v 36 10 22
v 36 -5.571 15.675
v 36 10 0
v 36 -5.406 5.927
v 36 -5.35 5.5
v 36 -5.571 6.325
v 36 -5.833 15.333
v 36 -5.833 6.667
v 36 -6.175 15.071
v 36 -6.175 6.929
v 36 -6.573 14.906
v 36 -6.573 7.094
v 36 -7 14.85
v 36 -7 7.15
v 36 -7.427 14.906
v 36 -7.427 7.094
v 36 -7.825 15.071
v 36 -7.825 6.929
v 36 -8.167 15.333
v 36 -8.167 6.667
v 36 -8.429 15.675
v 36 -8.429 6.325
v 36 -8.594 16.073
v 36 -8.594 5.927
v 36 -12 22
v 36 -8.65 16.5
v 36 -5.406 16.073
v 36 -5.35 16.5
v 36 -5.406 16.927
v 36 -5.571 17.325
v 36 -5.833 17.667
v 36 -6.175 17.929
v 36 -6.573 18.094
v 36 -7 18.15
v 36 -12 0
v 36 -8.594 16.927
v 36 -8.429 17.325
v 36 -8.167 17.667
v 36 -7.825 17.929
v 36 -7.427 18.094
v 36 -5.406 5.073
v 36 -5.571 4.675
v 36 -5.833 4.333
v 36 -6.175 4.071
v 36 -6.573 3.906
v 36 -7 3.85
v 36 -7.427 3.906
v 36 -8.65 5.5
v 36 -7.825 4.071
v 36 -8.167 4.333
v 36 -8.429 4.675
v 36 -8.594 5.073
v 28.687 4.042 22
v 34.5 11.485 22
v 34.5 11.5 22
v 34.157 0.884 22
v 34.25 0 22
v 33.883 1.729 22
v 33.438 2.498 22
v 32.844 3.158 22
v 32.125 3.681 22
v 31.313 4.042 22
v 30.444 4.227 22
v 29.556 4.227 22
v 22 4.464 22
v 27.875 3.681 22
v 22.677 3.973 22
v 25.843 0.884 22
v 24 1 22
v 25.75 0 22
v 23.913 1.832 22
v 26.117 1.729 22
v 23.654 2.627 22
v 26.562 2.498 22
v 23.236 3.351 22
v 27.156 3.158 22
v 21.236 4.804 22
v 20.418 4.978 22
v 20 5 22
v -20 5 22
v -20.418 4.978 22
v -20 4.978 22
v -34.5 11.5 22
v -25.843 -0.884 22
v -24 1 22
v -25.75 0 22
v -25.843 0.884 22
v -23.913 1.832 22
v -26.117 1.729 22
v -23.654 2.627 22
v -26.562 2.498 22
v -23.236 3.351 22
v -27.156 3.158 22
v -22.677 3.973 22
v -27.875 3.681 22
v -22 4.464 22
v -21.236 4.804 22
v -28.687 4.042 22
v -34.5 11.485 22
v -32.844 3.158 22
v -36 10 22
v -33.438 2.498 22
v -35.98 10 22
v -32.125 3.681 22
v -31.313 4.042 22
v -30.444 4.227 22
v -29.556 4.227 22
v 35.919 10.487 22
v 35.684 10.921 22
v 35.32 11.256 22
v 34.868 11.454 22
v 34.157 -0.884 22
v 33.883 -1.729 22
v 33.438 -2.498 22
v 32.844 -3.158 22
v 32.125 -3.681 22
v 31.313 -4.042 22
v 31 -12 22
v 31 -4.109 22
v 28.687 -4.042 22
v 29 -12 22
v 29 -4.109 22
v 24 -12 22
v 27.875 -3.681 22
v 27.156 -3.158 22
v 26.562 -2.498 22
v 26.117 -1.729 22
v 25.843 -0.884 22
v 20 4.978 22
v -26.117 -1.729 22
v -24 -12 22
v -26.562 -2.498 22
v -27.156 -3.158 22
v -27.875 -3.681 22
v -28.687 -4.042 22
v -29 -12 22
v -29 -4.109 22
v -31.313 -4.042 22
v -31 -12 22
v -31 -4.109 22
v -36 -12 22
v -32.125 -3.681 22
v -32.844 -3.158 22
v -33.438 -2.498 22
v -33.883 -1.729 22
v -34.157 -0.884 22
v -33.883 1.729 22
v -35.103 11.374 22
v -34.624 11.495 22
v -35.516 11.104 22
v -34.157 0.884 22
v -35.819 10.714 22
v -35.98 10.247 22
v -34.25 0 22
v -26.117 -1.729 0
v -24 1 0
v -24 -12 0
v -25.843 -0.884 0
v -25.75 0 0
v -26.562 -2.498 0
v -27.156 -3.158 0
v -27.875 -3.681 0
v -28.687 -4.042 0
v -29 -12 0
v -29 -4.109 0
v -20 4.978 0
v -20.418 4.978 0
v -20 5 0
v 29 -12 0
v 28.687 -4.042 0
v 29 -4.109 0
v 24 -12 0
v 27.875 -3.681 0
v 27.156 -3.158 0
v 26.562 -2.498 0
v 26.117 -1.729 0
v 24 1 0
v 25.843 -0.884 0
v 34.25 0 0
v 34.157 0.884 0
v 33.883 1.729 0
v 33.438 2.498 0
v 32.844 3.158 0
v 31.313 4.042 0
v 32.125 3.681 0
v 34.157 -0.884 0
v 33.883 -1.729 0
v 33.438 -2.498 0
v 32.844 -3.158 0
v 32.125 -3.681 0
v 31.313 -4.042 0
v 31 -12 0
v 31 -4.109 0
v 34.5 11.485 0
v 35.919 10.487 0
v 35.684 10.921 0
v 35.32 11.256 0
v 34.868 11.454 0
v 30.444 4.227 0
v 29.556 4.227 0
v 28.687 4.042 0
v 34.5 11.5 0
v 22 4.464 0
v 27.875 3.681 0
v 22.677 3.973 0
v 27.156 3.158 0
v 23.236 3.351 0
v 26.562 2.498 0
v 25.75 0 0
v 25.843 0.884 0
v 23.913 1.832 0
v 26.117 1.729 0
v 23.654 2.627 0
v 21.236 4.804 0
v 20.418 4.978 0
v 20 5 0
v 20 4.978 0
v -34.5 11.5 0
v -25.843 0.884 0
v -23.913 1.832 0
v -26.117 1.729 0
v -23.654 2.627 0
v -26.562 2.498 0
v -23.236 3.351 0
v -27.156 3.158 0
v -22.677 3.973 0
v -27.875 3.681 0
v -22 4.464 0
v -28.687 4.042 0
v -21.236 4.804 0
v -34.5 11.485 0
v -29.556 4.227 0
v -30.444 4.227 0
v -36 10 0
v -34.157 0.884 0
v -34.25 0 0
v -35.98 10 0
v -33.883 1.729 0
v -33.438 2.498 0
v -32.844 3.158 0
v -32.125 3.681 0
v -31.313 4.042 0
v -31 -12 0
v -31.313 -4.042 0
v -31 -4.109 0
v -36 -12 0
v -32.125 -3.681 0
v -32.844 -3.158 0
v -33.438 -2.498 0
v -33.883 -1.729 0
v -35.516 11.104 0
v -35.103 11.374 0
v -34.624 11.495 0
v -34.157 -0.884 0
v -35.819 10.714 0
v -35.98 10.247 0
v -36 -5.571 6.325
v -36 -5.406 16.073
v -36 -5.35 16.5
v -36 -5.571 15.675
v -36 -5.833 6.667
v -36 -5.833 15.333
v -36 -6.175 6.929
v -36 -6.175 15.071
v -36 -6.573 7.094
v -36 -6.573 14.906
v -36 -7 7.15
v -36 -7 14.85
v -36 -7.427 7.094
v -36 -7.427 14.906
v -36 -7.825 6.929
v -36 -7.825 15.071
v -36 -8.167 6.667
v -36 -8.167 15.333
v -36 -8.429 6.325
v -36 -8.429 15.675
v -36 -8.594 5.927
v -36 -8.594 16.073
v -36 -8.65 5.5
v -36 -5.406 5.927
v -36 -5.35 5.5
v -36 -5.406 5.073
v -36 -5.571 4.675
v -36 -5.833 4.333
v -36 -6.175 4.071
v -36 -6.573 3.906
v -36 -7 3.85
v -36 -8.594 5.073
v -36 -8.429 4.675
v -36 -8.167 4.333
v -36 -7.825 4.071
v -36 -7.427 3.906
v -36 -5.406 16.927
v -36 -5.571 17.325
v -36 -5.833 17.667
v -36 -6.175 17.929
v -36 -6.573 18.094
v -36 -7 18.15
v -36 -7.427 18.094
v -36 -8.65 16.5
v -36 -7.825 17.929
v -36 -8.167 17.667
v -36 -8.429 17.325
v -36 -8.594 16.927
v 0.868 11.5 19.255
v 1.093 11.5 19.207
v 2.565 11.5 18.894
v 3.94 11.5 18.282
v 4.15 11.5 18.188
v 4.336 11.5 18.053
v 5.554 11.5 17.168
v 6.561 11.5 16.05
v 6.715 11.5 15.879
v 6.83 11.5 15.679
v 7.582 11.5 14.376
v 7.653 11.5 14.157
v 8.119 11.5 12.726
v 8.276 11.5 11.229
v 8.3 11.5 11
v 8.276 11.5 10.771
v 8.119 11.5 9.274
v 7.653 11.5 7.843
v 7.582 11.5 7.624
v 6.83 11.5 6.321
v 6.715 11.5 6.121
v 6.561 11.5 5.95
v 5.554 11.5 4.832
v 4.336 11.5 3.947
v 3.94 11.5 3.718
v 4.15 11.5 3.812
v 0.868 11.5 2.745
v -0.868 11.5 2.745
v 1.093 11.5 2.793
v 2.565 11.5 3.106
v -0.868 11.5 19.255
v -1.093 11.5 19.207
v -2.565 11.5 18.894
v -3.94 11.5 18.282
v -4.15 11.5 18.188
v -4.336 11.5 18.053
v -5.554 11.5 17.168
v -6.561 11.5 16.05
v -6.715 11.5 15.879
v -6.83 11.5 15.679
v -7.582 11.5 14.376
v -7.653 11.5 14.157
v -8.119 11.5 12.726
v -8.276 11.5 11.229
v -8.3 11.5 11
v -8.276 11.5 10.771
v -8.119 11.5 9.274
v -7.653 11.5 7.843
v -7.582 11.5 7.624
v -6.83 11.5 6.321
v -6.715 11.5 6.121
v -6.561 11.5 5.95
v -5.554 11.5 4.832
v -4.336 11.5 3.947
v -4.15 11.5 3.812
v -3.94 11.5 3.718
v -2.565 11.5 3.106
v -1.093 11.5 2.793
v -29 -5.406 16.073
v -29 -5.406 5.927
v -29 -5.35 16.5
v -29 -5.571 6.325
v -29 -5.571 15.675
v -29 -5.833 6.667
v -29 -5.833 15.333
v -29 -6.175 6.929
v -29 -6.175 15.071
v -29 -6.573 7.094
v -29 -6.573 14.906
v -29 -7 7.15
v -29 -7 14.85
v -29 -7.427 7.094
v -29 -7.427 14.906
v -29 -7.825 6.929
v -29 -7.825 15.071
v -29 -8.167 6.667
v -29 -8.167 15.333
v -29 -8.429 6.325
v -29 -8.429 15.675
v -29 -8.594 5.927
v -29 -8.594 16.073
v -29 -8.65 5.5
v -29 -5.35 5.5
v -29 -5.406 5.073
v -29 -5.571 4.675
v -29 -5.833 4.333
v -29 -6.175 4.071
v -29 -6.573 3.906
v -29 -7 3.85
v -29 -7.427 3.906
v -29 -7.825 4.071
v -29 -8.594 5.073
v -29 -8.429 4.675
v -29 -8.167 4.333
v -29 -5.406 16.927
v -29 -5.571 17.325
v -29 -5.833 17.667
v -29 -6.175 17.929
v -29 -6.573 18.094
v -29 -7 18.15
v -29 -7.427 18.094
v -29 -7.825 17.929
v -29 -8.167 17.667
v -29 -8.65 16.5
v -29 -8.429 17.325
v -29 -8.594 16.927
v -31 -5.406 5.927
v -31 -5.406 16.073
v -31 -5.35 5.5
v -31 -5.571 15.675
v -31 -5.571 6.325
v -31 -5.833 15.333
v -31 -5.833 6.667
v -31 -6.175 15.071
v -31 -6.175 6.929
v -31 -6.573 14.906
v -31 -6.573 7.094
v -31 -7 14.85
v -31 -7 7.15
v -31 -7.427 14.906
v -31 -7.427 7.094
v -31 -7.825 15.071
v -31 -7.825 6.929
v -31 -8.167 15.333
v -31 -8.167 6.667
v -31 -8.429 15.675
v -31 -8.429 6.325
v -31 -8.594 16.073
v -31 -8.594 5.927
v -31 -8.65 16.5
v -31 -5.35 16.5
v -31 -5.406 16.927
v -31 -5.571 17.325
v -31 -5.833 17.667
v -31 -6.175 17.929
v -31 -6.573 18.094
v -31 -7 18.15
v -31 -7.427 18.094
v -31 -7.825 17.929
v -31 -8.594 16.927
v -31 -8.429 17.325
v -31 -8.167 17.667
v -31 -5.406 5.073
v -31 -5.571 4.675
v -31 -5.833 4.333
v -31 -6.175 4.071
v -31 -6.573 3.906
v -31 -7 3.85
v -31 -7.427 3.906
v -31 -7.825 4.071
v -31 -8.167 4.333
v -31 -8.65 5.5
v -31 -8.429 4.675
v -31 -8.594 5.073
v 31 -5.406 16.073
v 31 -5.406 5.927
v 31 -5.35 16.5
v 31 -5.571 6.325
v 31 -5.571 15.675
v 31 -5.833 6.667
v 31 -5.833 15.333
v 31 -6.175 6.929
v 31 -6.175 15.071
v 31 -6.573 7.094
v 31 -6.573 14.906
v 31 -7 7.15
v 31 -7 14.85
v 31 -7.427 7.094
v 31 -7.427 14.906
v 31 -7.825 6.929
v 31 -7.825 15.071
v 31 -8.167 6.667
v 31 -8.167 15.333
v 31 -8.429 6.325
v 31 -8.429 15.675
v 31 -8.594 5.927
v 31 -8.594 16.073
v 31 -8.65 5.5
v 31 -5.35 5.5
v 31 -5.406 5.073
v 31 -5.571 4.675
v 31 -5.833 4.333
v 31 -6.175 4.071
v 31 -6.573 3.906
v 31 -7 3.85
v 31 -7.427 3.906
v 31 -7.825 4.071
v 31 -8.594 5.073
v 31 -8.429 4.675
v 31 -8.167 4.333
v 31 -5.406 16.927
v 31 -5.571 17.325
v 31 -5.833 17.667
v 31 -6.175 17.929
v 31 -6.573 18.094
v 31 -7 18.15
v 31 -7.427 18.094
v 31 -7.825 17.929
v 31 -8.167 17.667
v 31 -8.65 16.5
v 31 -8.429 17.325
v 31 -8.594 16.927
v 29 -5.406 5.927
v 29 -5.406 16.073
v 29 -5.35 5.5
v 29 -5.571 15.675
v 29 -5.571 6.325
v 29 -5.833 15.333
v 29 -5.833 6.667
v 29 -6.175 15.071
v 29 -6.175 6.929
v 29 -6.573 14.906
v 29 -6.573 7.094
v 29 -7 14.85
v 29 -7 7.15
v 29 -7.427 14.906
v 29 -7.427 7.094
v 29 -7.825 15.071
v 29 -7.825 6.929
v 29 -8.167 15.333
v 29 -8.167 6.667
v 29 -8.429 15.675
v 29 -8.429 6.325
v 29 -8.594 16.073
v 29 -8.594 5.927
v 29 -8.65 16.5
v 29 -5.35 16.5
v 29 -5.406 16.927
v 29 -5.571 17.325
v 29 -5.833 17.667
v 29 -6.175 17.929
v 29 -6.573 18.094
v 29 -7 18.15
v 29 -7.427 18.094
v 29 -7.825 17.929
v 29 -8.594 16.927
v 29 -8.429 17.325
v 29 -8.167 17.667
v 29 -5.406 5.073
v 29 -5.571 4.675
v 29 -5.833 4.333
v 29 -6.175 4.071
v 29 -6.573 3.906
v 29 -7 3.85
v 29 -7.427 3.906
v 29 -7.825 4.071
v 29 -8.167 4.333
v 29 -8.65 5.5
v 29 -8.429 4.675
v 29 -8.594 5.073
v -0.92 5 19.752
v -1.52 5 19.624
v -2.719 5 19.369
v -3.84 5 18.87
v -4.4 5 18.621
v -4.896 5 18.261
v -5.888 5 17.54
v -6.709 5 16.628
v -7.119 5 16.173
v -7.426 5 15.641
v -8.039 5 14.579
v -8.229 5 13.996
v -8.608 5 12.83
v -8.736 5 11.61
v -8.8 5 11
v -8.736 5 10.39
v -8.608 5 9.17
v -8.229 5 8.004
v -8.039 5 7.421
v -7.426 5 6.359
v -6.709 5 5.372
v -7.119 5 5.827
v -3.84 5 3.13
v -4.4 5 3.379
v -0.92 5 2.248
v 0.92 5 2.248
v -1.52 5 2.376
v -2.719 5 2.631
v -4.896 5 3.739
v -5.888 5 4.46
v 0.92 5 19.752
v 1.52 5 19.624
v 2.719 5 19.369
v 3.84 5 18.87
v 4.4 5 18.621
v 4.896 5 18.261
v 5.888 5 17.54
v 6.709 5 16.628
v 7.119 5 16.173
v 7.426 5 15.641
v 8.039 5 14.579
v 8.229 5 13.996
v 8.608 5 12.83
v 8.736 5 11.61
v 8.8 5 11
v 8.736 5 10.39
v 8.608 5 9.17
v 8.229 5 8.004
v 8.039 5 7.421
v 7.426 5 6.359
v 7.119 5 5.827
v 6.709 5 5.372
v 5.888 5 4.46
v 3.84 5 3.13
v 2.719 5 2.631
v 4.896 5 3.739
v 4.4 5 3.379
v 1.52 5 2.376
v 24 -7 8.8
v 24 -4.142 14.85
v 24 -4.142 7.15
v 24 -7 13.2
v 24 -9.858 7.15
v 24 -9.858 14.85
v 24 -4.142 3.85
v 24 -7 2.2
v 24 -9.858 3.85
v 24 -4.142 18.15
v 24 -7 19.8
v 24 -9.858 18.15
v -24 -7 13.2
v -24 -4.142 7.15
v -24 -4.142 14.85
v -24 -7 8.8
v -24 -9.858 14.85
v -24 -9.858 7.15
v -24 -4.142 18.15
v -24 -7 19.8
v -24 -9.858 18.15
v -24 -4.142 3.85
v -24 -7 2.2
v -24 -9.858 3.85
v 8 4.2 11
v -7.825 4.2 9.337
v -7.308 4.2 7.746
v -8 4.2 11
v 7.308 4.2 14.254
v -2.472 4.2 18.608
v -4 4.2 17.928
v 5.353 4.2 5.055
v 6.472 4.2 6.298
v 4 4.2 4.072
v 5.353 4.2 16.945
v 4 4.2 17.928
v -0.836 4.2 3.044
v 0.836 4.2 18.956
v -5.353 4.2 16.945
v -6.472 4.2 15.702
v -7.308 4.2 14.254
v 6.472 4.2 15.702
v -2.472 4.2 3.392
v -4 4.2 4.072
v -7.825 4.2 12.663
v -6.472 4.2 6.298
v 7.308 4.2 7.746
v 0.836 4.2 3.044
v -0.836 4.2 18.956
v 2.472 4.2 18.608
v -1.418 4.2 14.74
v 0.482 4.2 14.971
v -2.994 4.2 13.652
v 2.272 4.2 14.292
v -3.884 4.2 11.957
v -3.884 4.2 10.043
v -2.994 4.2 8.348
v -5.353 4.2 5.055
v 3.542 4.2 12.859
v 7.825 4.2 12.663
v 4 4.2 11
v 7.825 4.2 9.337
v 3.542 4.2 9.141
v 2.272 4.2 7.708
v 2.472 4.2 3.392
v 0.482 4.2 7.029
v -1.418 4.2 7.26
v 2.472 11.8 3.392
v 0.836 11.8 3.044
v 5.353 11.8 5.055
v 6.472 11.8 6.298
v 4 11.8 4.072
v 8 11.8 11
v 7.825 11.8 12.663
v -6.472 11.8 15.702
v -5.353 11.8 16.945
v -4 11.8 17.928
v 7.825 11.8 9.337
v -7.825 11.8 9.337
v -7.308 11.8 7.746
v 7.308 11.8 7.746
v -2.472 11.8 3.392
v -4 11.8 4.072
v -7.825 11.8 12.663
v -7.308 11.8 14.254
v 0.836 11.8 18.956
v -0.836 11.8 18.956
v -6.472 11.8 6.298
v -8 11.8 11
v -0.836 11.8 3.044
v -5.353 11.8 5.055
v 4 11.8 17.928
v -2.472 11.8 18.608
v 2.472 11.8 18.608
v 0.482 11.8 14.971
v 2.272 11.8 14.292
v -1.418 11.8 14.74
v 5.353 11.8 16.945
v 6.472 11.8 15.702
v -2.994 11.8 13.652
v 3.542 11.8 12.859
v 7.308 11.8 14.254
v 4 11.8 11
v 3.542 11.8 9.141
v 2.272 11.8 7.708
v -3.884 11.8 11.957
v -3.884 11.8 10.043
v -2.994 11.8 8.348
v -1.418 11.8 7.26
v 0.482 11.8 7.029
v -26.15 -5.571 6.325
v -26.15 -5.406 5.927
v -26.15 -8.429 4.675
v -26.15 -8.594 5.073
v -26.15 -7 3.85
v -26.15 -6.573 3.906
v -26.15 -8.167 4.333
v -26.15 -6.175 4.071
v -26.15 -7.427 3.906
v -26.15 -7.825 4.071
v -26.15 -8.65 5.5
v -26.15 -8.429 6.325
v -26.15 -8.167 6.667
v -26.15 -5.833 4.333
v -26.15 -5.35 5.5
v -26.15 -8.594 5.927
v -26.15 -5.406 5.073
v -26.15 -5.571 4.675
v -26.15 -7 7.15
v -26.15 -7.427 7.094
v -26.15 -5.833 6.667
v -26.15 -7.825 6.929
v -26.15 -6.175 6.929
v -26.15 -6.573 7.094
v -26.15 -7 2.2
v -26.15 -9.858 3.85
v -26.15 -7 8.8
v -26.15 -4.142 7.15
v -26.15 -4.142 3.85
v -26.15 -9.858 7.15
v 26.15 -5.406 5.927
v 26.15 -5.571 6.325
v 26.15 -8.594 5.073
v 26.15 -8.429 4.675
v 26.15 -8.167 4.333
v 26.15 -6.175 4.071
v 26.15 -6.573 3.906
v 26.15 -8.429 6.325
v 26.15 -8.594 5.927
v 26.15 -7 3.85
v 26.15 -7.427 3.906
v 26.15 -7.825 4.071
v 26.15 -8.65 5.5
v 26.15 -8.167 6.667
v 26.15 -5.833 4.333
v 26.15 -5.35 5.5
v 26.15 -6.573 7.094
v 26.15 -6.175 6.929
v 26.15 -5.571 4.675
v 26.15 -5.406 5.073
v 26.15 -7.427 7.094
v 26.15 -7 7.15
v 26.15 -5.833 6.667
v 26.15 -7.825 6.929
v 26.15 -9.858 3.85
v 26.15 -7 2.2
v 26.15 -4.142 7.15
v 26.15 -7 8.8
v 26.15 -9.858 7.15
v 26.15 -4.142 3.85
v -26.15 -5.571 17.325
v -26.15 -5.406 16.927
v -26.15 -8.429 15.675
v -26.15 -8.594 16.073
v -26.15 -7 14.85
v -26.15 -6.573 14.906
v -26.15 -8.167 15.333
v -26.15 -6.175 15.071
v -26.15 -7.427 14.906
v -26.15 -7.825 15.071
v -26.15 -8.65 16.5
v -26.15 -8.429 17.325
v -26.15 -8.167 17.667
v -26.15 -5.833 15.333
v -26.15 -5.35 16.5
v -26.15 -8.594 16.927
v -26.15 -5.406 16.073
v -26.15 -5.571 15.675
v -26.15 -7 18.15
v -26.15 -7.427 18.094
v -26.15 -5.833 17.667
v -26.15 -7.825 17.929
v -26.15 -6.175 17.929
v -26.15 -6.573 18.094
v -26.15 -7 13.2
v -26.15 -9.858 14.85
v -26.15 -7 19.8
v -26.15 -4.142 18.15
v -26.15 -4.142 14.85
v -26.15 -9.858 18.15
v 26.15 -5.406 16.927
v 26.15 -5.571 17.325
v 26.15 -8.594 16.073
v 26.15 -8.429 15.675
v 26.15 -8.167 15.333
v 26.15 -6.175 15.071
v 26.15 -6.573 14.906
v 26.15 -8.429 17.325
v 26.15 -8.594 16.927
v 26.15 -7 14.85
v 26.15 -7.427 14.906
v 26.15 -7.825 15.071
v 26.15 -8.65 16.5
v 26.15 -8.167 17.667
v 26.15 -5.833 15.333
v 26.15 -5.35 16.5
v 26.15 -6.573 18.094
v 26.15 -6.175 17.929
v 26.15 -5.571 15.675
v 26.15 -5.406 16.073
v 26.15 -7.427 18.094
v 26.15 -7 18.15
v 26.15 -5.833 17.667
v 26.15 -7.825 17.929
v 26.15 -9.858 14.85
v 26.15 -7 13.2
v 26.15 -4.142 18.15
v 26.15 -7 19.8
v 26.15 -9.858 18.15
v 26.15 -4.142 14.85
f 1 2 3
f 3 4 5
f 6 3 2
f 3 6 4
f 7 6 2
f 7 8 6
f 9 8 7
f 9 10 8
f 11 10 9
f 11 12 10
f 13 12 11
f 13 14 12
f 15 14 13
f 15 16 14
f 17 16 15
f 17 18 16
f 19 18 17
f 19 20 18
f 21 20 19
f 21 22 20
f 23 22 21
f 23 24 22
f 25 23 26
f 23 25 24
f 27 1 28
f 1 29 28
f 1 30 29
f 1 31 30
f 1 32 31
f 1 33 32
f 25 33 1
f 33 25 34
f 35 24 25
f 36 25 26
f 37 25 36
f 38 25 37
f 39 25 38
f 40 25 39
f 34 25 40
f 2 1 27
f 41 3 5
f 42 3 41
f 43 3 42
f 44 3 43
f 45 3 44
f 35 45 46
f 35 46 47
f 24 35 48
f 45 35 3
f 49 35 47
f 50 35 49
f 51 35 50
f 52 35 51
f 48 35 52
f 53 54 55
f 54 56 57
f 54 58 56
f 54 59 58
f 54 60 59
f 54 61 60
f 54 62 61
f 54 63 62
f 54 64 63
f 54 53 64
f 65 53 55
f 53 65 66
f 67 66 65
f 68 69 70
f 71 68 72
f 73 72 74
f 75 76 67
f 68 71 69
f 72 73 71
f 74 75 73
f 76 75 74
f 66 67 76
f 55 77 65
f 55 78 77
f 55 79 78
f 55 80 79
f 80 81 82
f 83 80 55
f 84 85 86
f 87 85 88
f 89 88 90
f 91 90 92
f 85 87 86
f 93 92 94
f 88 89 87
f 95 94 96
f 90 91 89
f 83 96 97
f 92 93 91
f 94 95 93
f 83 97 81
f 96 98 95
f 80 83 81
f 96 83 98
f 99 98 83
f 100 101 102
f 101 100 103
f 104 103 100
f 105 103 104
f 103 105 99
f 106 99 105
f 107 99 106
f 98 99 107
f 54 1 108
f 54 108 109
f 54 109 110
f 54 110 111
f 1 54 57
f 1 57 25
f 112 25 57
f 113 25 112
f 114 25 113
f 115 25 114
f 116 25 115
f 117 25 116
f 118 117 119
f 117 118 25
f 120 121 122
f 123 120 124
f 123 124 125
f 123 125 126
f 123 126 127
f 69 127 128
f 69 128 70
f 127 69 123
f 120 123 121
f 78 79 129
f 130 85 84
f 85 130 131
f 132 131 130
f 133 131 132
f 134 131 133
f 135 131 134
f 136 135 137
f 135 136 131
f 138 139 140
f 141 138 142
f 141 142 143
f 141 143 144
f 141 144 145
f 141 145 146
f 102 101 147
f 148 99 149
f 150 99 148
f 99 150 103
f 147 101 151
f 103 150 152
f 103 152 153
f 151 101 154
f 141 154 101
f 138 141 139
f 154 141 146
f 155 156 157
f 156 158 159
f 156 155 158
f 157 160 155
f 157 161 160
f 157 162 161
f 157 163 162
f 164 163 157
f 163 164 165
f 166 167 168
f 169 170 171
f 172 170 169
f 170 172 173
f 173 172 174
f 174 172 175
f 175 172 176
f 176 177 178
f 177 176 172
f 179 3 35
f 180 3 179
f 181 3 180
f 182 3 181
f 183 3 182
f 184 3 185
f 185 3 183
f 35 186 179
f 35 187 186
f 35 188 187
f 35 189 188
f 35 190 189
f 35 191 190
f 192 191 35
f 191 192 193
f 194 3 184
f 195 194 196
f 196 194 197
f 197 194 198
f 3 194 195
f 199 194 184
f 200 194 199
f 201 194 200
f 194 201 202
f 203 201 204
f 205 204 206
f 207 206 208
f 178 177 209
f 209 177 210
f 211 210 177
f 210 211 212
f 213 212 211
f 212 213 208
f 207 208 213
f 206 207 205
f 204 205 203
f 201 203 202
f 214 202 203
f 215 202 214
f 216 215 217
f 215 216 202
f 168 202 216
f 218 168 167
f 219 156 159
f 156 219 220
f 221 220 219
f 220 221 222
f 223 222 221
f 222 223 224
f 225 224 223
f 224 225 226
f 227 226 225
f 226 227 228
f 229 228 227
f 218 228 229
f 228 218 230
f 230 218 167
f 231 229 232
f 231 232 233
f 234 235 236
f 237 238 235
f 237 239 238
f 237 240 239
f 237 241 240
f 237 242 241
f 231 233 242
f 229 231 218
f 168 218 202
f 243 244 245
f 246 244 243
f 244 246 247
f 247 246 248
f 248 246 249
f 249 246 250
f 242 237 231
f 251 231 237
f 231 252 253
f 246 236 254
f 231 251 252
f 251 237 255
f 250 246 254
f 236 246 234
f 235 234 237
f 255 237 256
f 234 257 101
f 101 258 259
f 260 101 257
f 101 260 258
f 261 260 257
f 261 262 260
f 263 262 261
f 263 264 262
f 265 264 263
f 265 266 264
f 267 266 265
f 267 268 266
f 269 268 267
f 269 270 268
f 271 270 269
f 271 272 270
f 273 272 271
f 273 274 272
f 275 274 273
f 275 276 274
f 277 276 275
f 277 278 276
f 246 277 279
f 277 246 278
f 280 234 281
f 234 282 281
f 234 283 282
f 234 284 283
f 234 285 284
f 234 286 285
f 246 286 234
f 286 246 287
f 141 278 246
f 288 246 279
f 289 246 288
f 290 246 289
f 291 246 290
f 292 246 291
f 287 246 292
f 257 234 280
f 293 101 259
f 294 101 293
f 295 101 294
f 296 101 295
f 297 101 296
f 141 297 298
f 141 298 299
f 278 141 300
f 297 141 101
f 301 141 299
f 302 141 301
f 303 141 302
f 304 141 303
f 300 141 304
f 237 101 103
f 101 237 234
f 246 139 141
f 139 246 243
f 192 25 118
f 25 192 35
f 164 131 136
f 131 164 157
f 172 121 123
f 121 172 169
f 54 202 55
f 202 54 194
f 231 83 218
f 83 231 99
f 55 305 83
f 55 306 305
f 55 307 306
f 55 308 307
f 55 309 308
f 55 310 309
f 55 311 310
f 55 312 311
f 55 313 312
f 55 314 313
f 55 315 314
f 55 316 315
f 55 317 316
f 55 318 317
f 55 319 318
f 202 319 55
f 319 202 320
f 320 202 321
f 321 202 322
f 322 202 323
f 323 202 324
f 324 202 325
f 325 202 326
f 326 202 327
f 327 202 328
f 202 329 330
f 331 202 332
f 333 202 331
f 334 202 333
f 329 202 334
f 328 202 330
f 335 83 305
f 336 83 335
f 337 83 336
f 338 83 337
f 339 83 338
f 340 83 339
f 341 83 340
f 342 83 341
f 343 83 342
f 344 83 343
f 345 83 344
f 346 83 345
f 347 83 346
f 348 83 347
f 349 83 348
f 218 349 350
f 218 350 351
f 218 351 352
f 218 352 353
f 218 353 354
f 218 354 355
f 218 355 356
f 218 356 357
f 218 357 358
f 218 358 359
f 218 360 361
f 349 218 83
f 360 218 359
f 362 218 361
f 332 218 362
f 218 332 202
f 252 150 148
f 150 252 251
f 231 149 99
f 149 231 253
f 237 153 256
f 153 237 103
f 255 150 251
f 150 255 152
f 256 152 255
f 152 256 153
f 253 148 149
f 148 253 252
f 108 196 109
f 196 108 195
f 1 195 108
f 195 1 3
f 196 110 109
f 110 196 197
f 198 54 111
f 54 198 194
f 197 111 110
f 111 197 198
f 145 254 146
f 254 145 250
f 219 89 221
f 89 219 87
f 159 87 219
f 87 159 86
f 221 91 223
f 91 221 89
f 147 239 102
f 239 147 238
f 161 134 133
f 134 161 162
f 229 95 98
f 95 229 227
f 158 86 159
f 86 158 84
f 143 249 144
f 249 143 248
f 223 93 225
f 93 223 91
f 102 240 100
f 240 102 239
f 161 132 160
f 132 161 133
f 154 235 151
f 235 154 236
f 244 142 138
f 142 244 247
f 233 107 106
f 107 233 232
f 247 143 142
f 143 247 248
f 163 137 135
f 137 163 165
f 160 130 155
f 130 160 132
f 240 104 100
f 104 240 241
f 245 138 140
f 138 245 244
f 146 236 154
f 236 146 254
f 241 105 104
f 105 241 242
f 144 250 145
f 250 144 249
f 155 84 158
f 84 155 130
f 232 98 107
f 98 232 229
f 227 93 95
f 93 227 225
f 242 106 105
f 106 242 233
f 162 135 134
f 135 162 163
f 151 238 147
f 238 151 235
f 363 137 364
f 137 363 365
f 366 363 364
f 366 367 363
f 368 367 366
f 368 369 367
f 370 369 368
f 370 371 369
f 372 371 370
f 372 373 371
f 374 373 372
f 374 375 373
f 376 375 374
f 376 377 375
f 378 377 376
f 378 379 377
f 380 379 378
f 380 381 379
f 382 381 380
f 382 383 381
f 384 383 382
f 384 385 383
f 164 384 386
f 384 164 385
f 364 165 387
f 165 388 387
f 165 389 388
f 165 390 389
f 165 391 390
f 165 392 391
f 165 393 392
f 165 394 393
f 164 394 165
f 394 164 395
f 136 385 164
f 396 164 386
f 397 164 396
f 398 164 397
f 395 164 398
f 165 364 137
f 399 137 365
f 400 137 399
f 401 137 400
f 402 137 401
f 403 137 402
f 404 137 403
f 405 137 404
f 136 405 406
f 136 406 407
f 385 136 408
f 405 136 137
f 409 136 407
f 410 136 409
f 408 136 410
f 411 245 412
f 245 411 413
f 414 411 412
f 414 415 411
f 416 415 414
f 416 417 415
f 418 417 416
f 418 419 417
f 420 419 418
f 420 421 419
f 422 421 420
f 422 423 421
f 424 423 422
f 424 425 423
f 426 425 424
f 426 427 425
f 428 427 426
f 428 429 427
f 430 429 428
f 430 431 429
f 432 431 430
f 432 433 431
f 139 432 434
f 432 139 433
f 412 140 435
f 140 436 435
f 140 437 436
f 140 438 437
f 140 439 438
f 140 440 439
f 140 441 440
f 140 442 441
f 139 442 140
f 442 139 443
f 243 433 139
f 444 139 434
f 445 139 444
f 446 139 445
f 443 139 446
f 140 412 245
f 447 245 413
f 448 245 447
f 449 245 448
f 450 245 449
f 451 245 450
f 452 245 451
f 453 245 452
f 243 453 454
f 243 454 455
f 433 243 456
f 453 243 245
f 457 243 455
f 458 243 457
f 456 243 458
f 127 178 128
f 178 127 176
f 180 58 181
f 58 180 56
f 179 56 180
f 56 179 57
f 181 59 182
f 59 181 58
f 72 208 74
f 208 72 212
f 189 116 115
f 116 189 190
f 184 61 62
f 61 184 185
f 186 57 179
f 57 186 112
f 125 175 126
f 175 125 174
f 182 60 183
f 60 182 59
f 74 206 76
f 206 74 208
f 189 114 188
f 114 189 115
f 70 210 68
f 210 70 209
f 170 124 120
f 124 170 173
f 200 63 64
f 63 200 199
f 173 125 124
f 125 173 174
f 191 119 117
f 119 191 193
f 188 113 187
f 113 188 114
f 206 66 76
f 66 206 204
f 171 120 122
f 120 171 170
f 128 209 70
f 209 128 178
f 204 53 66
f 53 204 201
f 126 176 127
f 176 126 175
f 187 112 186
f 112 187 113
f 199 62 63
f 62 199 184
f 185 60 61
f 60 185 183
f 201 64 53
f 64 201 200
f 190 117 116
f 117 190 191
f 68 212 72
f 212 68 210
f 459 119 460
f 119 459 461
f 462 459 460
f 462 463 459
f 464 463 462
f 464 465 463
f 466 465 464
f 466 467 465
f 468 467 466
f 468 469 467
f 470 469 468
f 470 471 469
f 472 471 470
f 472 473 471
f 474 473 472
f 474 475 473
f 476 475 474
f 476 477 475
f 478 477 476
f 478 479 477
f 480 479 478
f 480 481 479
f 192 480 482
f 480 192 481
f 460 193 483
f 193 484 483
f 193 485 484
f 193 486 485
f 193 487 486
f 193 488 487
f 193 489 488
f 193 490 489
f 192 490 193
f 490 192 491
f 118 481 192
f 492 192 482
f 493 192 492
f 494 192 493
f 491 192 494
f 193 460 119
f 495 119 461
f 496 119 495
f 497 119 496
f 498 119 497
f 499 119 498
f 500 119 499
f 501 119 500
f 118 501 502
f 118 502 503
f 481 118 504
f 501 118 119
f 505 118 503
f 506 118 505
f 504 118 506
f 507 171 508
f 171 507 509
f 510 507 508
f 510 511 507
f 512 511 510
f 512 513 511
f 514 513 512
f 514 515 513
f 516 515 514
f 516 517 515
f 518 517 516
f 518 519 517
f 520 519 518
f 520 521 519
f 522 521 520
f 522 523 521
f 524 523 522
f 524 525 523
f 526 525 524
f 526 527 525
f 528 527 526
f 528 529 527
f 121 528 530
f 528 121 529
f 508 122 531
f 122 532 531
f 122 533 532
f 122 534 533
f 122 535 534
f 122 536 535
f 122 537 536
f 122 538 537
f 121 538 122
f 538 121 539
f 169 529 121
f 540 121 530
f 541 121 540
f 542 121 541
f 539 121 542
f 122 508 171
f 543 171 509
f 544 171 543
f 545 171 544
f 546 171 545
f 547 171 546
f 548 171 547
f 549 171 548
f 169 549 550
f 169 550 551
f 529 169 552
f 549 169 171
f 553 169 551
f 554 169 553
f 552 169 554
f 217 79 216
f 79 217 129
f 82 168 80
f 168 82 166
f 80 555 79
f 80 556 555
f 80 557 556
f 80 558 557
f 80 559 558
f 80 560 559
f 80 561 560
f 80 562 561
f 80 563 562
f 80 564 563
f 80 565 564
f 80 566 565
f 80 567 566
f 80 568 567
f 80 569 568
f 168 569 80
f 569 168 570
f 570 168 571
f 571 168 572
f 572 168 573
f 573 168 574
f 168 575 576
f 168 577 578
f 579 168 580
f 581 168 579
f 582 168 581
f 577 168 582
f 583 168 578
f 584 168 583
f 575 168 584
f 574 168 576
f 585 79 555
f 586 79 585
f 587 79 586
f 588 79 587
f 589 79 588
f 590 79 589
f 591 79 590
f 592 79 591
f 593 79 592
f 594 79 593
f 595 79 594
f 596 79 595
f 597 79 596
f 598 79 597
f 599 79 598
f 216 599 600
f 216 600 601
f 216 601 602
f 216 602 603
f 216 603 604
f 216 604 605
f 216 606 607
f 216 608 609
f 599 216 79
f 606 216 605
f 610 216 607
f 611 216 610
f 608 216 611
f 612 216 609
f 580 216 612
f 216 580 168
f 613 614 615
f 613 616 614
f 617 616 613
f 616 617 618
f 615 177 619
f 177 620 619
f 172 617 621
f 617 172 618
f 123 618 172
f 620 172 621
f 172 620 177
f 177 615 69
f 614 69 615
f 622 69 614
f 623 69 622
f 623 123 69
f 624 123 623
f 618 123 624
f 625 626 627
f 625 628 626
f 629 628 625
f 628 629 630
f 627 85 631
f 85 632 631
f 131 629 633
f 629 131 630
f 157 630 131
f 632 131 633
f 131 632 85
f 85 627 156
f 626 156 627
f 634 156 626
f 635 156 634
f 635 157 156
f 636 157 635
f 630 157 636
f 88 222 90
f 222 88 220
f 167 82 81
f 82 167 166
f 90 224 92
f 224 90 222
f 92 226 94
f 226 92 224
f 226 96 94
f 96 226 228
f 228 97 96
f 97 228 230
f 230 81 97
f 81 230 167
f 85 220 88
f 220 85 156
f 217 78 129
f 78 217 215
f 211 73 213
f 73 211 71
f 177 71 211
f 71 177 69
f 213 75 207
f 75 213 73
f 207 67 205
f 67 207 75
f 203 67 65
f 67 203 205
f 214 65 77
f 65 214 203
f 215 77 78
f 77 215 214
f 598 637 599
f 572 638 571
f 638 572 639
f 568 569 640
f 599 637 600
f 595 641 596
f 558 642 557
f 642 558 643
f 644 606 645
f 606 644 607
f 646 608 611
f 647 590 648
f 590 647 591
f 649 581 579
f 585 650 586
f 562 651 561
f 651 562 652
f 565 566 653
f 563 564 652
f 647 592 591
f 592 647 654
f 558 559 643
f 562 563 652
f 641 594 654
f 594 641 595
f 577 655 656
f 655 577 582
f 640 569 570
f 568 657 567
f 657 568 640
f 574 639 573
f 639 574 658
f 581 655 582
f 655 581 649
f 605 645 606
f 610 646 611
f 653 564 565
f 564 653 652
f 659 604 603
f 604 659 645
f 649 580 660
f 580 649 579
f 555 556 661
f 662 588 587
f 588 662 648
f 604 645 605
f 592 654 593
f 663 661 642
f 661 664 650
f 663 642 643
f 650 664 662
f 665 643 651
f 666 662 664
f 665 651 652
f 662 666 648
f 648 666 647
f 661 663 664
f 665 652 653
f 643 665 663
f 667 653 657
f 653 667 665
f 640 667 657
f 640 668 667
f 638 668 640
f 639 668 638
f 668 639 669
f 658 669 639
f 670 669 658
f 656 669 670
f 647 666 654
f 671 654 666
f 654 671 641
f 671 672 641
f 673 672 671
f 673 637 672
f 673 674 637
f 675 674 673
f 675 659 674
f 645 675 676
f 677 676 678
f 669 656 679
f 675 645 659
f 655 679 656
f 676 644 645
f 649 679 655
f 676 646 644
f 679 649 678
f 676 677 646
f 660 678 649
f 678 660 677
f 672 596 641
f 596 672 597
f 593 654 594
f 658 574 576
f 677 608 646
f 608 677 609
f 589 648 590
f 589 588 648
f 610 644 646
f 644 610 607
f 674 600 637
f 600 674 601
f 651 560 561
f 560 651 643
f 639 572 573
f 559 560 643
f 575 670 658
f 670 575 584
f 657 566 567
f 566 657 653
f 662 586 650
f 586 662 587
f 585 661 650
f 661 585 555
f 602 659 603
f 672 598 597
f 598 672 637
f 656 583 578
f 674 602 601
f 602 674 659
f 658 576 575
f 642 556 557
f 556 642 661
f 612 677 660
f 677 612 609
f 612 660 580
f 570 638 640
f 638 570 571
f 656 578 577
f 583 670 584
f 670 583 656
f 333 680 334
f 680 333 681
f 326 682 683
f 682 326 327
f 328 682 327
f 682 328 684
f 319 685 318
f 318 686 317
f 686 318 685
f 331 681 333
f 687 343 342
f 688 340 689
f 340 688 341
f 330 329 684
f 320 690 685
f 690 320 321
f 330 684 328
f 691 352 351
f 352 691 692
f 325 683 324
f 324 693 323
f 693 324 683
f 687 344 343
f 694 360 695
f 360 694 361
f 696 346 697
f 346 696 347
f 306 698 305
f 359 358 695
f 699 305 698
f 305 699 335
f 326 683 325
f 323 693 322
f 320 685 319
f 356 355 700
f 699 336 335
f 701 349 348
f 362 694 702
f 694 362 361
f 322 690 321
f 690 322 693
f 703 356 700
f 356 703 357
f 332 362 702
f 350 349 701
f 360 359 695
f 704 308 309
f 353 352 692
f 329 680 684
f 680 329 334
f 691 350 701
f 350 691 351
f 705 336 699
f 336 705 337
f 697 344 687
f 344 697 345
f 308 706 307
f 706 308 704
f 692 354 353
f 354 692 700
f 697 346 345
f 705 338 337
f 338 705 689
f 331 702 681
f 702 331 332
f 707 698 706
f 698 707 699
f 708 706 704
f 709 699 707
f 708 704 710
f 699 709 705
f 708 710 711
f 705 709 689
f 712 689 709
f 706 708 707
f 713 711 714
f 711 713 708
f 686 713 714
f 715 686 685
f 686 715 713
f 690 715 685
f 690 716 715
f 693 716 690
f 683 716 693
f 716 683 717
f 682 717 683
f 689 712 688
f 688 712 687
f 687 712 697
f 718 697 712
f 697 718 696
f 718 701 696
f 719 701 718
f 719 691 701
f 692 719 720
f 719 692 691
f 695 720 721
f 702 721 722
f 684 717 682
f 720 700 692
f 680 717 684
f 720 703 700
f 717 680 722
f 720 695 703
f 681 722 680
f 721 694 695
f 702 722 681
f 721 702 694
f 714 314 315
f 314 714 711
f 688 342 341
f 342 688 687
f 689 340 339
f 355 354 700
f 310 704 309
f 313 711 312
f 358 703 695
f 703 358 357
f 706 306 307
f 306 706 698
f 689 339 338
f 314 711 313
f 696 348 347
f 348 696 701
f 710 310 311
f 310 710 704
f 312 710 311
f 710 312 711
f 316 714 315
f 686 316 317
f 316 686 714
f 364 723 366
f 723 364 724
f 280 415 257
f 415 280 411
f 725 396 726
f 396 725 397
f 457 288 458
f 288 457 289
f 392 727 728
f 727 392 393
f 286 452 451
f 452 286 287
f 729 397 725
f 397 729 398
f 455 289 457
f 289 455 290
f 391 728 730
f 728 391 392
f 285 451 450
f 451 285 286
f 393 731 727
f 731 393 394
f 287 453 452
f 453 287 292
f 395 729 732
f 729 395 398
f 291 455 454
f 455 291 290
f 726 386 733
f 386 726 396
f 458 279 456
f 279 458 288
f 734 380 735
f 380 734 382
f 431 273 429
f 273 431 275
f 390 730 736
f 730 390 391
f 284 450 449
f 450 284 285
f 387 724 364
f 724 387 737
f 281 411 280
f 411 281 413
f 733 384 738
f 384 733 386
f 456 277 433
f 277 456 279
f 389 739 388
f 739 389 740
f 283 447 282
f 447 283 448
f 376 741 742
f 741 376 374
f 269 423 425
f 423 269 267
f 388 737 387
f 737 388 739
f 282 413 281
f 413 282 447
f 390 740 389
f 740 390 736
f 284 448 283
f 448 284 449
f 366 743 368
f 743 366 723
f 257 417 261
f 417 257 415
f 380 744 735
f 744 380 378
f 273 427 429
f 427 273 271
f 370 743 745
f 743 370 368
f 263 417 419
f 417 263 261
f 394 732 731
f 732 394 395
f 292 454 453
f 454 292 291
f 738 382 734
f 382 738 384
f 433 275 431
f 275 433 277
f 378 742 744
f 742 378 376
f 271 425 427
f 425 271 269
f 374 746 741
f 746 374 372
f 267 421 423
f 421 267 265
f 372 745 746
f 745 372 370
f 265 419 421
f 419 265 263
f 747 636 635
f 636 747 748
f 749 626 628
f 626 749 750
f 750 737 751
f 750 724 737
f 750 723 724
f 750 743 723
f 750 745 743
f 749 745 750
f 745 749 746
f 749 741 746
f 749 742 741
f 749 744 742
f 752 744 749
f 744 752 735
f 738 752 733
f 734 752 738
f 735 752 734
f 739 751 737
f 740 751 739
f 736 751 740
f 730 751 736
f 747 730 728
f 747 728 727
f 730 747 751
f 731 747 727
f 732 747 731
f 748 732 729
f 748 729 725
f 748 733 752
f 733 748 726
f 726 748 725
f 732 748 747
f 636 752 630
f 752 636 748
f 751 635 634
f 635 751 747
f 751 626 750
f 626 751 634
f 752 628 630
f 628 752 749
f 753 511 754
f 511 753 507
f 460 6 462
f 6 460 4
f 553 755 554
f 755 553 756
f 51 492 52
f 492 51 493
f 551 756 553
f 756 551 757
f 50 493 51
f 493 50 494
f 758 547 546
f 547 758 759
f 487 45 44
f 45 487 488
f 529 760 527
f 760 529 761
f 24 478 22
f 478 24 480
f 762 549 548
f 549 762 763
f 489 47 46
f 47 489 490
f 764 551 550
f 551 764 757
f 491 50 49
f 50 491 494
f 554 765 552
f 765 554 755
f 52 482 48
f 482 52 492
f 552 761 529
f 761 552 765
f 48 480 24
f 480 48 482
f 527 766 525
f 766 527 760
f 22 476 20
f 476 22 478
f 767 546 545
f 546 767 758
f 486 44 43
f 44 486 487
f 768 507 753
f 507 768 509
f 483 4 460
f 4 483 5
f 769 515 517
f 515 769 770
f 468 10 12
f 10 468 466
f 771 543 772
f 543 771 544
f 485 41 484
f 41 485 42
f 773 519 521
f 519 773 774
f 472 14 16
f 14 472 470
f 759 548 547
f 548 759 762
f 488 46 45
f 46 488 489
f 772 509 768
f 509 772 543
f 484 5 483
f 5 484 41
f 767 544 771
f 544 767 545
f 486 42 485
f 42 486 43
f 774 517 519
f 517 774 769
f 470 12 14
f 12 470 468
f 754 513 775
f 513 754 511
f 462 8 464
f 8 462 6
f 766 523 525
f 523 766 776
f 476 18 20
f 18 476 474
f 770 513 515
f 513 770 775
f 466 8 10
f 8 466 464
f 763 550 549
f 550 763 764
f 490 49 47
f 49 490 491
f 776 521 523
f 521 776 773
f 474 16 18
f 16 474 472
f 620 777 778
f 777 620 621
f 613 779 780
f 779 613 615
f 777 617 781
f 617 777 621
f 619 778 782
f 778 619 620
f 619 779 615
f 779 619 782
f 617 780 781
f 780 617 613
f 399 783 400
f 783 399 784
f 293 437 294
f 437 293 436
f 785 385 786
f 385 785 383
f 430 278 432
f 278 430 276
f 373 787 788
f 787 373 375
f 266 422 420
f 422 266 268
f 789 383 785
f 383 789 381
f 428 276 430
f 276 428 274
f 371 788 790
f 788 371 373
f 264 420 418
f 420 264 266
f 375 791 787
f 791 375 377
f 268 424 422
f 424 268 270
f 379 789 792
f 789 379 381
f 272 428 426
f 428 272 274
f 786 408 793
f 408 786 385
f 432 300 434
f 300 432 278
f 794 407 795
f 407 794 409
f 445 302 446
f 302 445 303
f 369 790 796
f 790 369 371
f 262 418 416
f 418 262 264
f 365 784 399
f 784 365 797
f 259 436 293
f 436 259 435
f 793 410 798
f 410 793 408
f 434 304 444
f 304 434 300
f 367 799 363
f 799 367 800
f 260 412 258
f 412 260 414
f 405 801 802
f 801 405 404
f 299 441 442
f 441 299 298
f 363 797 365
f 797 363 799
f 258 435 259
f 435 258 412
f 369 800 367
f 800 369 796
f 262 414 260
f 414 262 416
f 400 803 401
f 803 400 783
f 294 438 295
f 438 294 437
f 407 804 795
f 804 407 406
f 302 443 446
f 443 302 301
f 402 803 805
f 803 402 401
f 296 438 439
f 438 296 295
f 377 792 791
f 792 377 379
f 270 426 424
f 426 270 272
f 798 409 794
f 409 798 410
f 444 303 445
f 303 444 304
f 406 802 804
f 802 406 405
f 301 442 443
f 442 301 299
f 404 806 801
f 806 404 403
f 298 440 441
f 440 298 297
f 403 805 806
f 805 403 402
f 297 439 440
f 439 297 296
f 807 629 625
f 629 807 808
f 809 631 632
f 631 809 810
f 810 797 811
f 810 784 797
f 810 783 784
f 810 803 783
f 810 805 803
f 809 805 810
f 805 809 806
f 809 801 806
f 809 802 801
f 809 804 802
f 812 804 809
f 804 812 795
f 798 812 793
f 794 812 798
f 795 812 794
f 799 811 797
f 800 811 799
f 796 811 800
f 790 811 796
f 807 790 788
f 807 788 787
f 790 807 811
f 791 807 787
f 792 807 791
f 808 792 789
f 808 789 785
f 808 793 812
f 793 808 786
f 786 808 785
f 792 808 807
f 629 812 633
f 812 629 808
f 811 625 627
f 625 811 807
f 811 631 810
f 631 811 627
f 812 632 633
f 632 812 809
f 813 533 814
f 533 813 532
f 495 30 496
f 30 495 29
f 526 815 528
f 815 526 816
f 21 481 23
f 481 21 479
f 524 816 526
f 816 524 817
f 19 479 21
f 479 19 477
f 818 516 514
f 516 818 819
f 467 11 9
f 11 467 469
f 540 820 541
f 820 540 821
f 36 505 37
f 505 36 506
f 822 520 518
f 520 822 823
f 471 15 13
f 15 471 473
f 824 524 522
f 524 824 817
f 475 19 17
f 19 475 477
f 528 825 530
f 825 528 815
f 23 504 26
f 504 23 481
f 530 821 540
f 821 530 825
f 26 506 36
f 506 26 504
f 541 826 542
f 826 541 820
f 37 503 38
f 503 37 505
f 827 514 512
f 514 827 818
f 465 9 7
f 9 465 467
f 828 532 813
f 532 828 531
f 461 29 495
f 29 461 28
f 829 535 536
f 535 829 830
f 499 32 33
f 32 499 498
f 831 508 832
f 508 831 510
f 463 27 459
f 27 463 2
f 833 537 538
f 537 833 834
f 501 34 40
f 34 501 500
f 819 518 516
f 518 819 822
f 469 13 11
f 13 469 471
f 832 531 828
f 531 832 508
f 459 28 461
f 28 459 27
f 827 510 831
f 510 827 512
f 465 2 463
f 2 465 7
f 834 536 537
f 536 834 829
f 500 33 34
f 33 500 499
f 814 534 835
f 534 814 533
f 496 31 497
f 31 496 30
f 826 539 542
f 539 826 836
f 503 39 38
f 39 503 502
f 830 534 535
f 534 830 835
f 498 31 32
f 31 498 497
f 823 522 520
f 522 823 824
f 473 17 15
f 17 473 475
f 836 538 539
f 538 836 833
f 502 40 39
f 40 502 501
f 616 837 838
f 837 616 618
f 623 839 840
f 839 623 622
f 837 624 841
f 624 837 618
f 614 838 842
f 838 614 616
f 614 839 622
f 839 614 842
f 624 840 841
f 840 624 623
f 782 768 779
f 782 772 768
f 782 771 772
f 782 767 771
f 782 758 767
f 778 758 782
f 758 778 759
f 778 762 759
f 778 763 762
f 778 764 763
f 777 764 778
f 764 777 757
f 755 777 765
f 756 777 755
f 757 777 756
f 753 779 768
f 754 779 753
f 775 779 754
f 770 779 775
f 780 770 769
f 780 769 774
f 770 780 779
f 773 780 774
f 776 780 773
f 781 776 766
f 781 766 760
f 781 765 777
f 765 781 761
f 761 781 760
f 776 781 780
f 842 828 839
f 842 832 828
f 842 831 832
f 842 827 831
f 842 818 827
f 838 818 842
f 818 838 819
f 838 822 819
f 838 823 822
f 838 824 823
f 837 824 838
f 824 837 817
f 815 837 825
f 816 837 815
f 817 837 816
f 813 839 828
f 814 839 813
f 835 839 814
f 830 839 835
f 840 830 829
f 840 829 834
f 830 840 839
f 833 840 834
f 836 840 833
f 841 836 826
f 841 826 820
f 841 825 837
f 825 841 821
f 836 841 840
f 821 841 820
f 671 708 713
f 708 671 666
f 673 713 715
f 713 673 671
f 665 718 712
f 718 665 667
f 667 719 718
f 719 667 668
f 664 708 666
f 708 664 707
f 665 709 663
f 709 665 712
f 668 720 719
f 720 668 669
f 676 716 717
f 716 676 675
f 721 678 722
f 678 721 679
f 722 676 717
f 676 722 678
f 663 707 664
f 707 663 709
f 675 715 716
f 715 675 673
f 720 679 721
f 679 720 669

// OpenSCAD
// file: bracket_no_holl.scad
$fa = 12;
$fs = 0.5;

w = 60; // Smooth rod distance (center to center)

module screws() {
  for (x = [-w/2, w/2]) {
    translate([x, 0, 0]) {
      // Push-through M3 screw hole.
      translate([0, -6, 0]) rotate([0, 90, 0])
	cylinder(r=1.65, h=20, center=true, $fn=24);
      // M3 nut holder.
      translate([-x/5, -6, 0])
	rotate([0, 0, 0]) rotate([0, 90, 0])
	cylinder(r=3.3, h=2.3, center=true, $fn=6);
    }
  }
}

module bracket(h) {
  difference() {
    union() {
      translate([0, -1, 0]) cube([w+12, 22, h], center=true);
      // Sandwich mount.
      translate([0, 10.5, 0]) cube([w+9, 2, h], center=true);
      translate([-w/2-4.5, 10, 0]) cylinder(r=1.5, h=h, center=true);
      translate([w/2+4.5, 10, 0]) cylinder(r=1.5, h=h, center=true);
    }
    // Smooth rod mounting slots.
    for (x = [-w/2, w/2]) {
      translate([x, 0, 0]) {
	cylinder(r=4.25, h=h+1, center=true);
	translate([0, -10, 0]) cube([2, 20, h+1], center=true);
      }
    }
    // Belt path.
    translate([0, -5, 0]) cube([w-20, 20, h+1], center=true);
    translate([0, -9, 0]) cube([w-12, 20, h+1], center=true);
    translate([-w/2+10, 1, 0]) cylinder(r=4, h=h+1, center=true);
    translate([w/2-10, 1, 0]) cylinder(r=4, h=h+1, center=true);
  }
}

translate([0, 0, 10]) bracket(20);
// file: configuration.scad
motor_end_height=44;
idler_end_height=28;
carriage_height=24;
platform_thickness=8;

sanguinololu=true;					// places mounting holes for the Sanguinololu controller
carbon_rods=true;					// turns on option for carbon diagonal rods just for looks!

frame_thickness=6;   				// 6mm acrylic
pcb_thickness=2;						// used for rendering PCB and approximating build volume

smooth_rod_length=495;  				// determins vertical build height with 508 for 8" 
rod_diameter=8;						// might be interesting to have larger rods
platform_hinge_offset=33;
carriage_hinge_offset=22;

printbed=[155,155];  				// printrbed 6x6 -  210,210 for prusa 8x8 platform
printbed_screw_spacing=[146.5,147]; 	// sets screw spacing for heated bed default: printrbed

tower_radius = printbed[0]*0.9;
rod_length=printbed[0]*1.2;

corner_radius=12;
frame_radius=(tower_radius-rod_diameter/2-corner_radius)/cos(30);
// main file
include <configuration.scad>
use <bracket_no_holl.scad>

h = 22; // Total height.

module bearing_mount() {
  translate([0, 0, 2.3]) cylinder(r1=11, r2=8, h=3, center=true);
  translate([0, 0, -2.3]) cylinder(r1=8, r2=11, h=3, center=true);
}

module belt_idler() {
  translate([0, 0, h/2]) 
  difference() {
    union() {
      bracket(h);
      translate([0, 8, 0]) rotate([90, 0, 0]) bearing_mount();
    }
    translate([0, 8, 0]) rotate([90, 0, 0])
      cylinder(r=4, h=40, center=true);
    for (i = [-1, 1])
	 for (z = [-5.5, 5.5])
       translate([i, -1, z]) screws();
  }
}

belt_idler();
